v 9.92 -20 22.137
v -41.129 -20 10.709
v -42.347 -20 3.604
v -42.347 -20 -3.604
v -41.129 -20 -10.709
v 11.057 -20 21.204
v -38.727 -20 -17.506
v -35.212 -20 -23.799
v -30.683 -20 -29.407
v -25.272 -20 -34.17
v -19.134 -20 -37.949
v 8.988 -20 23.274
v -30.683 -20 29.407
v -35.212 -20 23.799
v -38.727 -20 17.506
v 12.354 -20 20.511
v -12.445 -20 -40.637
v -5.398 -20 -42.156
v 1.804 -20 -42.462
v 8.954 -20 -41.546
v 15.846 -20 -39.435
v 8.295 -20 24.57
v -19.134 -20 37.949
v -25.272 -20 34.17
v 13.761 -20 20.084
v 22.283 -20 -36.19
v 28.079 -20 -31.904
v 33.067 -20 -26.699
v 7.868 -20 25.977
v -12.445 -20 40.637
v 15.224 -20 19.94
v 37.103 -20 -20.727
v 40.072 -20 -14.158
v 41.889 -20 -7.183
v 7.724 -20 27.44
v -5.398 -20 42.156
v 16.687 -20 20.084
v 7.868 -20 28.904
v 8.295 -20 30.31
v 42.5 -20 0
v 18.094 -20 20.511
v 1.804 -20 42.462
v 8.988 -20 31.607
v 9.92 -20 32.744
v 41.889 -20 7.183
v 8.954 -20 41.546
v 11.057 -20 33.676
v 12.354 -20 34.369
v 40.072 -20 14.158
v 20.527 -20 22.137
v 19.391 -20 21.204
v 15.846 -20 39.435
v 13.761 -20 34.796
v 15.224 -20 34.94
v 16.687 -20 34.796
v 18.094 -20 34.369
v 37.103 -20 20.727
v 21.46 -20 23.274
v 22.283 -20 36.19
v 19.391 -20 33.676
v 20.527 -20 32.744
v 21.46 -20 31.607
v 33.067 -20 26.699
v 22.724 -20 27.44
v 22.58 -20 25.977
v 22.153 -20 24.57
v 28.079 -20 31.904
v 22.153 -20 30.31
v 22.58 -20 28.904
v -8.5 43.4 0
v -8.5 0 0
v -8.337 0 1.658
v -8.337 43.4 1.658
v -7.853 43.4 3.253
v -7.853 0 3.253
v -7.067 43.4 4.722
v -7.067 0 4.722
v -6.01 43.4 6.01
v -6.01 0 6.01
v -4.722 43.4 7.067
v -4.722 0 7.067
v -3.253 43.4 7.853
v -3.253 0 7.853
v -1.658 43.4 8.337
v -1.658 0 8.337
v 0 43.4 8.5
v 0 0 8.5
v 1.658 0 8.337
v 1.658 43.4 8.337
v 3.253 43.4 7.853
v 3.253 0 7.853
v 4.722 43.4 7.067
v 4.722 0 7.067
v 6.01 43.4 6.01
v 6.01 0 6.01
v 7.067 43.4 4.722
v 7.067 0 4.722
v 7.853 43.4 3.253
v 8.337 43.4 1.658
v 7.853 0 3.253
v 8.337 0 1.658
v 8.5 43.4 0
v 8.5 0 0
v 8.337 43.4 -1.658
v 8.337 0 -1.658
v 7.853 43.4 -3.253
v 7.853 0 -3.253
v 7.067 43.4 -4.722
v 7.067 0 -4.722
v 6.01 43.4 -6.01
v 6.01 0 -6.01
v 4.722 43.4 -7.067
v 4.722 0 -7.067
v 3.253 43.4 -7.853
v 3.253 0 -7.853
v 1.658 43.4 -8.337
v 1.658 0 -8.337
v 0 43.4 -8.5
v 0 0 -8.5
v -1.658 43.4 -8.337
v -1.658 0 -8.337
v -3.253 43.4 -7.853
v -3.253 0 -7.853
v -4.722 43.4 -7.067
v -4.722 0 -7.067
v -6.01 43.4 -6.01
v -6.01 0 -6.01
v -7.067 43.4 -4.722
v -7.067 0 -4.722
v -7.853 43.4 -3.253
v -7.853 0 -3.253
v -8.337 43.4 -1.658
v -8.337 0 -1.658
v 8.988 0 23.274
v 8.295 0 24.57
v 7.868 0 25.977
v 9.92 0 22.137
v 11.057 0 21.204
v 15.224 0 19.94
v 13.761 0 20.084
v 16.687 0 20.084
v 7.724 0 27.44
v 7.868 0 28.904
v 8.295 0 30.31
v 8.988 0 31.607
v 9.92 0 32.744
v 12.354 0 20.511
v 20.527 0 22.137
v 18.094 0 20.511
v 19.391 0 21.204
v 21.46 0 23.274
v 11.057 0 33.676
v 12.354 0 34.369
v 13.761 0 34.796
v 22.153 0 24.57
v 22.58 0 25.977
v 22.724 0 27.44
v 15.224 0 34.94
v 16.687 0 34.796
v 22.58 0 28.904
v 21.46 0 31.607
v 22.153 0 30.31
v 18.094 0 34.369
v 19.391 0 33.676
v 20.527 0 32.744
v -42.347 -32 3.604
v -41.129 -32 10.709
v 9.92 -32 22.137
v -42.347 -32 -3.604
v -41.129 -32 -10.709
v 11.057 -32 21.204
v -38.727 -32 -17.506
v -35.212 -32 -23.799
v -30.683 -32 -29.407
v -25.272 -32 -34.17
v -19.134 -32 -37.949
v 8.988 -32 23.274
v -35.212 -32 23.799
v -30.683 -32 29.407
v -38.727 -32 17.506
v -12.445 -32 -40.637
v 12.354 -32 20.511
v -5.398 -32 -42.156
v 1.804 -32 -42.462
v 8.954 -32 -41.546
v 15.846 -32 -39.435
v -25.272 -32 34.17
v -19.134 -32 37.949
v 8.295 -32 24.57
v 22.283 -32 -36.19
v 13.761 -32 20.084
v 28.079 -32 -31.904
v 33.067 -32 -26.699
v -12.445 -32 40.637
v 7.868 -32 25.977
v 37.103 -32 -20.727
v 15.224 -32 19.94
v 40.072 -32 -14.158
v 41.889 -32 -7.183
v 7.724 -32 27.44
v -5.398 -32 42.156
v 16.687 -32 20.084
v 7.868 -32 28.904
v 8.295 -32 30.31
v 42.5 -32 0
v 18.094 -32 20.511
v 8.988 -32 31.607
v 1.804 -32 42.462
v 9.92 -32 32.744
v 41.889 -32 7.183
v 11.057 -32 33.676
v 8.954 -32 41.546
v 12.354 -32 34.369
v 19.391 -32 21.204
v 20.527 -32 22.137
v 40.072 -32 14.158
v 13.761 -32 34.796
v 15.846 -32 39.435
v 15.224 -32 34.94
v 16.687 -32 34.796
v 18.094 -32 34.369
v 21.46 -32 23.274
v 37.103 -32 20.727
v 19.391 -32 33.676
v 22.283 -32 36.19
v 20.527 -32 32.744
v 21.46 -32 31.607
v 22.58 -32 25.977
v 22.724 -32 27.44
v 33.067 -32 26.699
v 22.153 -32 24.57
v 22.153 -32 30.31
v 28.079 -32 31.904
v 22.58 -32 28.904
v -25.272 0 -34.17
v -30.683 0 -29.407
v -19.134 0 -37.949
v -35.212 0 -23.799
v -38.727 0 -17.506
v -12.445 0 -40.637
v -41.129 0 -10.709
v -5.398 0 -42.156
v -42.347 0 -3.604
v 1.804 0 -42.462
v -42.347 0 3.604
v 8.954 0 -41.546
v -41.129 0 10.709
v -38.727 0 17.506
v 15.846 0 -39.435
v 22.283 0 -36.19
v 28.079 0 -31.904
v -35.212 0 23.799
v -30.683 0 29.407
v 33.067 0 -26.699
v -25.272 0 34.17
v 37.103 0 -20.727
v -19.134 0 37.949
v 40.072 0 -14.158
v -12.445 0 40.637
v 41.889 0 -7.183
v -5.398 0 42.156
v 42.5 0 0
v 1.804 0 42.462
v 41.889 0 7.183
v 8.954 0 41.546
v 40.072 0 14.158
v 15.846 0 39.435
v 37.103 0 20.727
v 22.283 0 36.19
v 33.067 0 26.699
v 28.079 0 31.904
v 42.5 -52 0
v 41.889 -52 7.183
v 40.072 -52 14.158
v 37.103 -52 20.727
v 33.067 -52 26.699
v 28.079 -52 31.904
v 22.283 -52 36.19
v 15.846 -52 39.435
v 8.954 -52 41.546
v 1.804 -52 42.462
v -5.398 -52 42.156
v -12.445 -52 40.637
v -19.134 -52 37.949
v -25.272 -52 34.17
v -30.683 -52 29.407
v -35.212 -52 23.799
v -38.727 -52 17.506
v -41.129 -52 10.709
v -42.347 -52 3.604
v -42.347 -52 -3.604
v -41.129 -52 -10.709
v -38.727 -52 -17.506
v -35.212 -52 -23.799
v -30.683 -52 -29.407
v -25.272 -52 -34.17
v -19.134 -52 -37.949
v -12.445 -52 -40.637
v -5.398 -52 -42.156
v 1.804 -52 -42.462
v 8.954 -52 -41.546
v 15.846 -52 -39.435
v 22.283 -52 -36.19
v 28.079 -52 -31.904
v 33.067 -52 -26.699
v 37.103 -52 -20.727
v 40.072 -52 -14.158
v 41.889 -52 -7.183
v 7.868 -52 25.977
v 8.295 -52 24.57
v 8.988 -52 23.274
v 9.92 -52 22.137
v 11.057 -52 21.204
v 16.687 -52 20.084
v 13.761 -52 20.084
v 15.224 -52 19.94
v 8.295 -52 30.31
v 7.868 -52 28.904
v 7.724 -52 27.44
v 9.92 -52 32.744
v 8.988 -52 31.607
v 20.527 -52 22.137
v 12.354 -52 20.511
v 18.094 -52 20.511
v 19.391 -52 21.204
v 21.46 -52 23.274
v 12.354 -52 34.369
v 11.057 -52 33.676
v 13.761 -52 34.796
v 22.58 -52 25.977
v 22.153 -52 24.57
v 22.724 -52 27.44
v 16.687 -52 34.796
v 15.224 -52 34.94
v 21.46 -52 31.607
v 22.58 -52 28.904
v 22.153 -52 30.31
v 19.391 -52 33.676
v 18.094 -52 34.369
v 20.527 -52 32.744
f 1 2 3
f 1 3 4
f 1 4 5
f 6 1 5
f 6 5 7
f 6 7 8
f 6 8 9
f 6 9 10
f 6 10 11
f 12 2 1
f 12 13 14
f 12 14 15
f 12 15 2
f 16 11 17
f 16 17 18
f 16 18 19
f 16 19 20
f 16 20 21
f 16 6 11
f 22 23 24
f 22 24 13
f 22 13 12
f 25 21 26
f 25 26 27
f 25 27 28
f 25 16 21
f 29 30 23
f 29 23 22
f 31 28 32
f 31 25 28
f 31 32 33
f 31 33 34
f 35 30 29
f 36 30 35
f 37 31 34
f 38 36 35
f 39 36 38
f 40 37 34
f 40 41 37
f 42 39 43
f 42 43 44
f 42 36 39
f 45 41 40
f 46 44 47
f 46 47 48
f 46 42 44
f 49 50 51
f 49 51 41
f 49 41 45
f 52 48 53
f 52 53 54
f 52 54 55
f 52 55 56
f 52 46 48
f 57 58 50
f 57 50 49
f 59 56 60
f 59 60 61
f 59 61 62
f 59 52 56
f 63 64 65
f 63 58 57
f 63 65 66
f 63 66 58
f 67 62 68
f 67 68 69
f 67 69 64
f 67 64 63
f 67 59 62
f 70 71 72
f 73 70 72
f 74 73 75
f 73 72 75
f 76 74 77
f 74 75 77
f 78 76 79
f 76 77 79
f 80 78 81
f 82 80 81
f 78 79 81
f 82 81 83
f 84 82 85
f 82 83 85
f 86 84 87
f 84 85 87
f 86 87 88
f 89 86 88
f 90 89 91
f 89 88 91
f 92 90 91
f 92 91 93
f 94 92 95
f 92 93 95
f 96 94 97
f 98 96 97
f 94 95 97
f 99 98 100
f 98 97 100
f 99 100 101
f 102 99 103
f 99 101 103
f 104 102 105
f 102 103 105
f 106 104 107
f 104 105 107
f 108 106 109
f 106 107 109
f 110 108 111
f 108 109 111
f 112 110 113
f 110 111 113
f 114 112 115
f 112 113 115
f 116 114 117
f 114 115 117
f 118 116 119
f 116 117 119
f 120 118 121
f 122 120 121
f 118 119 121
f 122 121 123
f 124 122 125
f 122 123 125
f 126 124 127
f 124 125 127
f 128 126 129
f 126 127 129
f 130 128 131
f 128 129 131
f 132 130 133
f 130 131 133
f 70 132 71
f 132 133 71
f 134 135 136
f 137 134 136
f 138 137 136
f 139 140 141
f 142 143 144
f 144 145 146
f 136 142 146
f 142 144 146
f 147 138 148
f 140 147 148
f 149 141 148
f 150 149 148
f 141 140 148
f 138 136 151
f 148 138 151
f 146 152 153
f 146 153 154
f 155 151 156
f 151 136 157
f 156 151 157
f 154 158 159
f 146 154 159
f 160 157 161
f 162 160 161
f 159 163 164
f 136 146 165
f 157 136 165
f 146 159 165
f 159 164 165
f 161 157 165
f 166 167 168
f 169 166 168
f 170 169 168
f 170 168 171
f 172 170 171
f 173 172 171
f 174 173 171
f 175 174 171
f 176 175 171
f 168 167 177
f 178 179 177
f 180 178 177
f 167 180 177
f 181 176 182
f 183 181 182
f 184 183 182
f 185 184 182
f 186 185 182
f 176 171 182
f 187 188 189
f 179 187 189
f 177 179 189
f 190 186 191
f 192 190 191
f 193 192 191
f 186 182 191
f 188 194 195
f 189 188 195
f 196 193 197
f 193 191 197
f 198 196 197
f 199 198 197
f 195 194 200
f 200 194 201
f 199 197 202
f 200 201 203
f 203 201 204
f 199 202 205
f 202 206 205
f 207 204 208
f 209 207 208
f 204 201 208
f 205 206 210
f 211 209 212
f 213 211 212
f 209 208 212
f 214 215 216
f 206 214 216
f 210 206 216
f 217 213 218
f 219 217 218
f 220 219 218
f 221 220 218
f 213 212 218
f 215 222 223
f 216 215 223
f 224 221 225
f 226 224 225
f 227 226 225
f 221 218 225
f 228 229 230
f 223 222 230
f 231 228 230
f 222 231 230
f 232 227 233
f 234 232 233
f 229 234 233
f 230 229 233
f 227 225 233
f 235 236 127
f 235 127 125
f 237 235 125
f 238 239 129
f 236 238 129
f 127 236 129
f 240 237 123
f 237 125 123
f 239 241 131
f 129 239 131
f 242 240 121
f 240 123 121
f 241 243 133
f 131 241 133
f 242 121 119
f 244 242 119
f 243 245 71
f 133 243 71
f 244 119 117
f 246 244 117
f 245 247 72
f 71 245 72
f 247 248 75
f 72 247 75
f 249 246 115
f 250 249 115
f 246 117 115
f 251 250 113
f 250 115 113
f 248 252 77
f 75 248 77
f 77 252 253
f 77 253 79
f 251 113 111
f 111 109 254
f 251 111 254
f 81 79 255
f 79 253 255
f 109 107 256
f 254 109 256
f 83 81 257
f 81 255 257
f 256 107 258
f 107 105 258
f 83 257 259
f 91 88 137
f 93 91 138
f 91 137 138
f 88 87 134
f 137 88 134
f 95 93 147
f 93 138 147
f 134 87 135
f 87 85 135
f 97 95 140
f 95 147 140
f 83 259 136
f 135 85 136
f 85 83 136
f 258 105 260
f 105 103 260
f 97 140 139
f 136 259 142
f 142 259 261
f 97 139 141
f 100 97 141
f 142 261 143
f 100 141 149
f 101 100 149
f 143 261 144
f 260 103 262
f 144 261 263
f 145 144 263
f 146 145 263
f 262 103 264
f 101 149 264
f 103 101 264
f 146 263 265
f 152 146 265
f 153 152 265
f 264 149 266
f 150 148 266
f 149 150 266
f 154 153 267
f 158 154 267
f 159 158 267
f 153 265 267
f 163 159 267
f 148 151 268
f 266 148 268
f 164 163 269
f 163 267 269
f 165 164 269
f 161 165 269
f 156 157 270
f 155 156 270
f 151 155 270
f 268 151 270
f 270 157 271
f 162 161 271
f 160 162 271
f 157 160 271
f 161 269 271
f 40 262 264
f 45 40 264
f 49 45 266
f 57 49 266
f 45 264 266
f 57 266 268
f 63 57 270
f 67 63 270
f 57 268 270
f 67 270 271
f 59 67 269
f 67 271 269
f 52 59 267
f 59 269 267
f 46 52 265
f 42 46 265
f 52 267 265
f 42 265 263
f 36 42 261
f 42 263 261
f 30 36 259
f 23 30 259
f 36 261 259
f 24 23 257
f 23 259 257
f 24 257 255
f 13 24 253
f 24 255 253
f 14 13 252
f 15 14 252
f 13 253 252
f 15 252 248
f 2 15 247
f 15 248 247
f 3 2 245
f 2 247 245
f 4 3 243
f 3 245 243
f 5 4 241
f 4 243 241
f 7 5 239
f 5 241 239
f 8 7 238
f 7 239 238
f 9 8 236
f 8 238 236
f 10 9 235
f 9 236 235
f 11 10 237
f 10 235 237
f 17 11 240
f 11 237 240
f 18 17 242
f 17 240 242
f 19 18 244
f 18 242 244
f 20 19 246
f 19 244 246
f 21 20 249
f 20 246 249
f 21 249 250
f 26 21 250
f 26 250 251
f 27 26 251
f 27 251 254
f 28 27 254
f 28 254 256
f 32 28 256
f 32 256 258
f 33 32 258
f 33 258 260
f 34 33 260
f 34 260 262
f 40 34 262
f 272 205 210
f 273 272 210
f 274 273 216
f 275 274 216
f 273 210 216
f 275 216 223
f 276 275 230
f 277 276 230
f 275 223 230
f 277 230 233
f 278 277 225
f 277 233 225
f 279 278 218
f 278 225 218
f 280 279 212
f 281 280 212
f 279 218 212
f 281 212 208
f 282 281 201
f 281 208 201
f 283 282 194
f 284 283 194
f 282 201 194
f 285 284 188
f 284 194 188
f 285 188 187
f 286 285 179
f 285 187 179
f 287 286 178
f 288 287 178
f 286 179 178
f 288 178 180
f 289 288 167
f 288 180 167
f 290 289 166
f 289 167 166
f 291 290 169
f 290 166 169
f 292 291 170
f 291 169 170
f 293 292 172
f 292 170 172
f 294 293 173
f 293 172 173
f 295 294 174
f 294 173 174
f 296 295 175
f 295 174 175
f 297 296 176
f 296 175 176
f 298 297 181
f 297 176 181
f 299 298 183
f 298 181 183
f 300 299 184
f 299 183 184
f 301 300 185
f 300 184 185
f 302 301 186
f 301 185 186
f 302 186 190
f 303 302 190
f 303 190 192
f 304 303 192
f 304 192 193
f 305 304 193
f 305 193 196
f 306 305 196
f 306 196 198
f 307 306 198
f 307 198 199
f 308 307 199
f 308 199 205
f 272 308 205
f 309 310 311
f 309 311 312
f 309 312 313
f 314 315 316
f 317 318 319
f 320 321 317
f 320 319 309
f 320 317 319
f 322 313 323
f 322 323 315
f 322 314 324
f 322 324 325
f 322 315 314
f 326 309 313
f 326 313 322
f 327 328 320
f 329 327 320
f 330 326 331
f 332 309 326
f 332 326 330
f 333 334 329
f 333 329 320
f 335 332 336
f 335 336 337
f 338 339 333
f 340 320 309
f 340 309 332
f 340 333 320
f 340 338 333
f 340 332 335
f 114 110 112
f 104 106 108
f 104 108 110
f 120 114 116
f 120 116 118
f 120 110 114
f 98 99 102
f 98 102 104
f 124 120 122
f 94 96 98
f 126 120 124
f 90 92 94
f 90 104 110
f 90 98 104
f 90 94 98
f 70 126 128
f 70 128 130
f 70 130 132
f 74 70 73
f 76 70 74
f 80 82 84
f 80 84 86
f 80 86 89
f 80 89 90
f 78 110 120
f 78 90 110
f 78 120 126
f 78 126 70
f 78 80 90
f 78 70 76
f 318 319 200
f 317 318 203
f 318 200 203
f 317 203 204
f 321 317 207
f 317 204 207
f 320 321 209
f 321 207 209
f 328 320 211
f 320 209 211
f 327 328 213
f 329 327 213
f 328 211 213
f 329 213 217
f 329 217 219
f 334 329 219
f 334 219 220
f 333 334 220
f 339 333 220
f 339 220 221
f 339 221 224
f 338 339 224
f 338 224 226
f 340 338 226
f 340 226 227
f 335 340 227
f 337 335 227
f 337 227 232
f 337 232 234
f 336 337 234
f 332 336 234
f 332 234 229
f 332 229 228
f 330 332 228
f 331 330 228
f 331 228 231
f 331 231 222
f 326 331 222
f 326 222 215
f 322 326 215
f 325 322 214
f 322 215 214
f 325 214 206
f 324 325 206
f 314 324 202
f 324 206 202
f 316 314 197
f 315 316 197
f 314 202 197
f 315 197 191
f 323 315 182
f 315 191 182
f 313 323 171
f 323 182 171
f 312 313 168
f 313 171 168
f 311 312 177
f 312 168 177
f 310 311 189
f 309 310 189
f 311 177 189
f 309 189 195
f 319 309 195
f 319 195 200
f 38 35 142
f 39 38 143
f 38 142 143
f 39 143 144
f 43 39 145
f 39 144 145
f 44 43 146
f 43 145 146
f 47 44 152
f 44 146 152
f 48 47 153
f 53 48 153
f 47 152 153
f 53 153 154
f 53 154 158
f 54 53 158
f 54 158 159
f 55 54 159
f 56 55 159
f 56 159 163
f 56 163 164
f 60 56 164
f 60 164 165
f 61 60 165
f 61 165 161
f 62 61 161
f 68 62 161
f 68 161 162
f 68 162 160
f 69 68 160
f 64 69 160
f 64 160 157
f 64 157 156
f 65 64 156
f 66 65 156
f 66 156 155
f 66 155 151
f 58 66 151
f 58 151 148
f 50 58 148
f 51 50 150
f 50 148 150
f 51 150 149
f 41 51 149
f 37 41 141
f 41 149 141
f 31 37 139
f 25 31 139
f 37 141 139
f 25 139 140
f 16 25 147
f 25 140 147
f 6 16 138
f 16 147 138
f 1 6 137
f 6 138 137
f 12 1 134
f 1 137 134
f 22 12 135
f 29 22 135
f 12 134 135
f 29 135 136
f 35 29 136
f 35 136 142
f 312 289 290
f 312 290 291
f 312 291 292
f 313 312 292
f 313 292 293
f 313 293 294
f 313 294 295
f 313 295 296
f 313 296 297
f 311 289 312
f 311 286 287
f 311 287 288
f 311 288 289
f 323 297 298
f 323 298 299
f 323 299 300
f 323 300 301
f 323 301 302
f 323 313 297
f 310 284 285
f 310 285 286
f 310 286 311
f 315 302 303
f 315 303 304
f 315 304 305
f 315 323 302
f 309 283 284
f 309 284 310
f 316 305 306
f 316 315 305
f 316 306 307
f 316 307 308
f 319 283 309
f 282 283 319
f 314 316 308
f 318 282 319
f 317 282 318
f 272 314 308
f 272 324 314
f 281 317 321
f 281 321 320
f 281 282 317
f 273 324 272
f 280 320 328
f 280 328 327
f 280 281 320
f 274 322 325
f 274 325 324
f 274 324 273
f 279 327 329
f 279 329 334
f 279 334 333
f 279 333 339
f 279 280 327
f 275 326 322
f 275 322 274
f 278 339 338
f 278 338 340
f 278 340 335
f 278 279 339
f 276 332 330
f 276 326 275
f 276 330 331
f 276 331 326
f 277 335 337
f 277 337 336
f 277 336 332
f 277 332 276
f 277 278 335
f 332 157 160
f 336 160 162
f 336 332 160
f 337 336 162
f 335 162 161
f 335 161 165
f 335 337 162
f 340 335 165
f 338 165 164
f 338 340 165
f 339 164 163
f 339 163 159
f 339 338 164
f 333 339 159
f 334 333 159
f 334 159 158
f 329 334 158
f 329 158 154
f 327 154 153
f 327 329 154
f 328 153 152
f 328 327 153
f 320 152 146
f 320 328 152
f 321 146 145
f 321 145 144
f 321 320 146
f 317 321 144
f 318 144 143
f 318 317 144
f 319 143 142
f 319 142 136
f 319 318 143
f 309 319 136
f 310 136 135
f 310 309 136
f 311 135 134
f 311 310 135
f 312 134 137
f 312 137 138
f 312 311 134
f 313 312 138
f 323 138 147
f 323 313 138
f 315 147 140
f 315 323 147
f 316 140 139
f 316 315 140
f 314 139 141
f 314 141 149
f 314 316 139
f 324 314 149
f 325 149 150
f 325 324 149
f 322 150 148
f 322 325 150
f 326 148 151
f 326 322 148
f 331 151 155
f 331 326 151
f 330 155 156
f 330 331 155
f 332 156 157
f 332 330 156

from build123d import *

# Parameters (mm, degrees)
F0_R       = 42.5
F1_DEPTH   = 20
F3_R       = 42.5
F4_DEPTH   = 20
F5_R       = 8.5
F6_DEPTH   = 43.4
F8_D       = 15
F8_DEPTH   = 80
F8_2_D     = 15
F8_2_DEPTH = 80
F9_R       = 7.5
F10_DEPTH  = 52


with BuildPart() as f1:
    # F0 (on Front) → F1 (new body)
    with BuildSketch(Plane.XZ):
        Circle(F0_R)
    extrude(amount=F1_DEPTH)

    # F5 (on face) → F6 (join)
    with BuildSketch(Plane(origin=(0, 0, 0), x_dir=(-1, 0, 0), z_dir=(0, 1, 0))):
        Circle(F5_R)
    extrude(amount=F6_DEPTH)

    # F8
    with Locations(Plane.XZ.offset(52)):
        with Locations((15.223749, 27.440336)):
            Hole(F8_D / 2, depth=F8_DEPTH)


with BuildPart() as f4:
    # F3 (on offset) → F4 (new body)
    with BuildSketch(Plane.XZ.offset(32)):
        Circle(F3_R)
    extrude(amount=F4_DEPTH)

    # F8#2
    with Locations(Plane.XZ.offset(52)):
        with Locations((15.223749, 27.440336)):
            Hole(F8_2_D / 2, depth=F8_2_DEPTH)


with BuildPart() as f10:
    # F9 (on face) → F10 (new body)
    with BuildSketch(Plane.XZ.offset(52)):
        with Locations((15.223749, 27.440336)):
            Circle(F9_R)
    extrude(amount=-F10_DEPTH)


solid = Compound([f1.part, f4.part, f10.part])
